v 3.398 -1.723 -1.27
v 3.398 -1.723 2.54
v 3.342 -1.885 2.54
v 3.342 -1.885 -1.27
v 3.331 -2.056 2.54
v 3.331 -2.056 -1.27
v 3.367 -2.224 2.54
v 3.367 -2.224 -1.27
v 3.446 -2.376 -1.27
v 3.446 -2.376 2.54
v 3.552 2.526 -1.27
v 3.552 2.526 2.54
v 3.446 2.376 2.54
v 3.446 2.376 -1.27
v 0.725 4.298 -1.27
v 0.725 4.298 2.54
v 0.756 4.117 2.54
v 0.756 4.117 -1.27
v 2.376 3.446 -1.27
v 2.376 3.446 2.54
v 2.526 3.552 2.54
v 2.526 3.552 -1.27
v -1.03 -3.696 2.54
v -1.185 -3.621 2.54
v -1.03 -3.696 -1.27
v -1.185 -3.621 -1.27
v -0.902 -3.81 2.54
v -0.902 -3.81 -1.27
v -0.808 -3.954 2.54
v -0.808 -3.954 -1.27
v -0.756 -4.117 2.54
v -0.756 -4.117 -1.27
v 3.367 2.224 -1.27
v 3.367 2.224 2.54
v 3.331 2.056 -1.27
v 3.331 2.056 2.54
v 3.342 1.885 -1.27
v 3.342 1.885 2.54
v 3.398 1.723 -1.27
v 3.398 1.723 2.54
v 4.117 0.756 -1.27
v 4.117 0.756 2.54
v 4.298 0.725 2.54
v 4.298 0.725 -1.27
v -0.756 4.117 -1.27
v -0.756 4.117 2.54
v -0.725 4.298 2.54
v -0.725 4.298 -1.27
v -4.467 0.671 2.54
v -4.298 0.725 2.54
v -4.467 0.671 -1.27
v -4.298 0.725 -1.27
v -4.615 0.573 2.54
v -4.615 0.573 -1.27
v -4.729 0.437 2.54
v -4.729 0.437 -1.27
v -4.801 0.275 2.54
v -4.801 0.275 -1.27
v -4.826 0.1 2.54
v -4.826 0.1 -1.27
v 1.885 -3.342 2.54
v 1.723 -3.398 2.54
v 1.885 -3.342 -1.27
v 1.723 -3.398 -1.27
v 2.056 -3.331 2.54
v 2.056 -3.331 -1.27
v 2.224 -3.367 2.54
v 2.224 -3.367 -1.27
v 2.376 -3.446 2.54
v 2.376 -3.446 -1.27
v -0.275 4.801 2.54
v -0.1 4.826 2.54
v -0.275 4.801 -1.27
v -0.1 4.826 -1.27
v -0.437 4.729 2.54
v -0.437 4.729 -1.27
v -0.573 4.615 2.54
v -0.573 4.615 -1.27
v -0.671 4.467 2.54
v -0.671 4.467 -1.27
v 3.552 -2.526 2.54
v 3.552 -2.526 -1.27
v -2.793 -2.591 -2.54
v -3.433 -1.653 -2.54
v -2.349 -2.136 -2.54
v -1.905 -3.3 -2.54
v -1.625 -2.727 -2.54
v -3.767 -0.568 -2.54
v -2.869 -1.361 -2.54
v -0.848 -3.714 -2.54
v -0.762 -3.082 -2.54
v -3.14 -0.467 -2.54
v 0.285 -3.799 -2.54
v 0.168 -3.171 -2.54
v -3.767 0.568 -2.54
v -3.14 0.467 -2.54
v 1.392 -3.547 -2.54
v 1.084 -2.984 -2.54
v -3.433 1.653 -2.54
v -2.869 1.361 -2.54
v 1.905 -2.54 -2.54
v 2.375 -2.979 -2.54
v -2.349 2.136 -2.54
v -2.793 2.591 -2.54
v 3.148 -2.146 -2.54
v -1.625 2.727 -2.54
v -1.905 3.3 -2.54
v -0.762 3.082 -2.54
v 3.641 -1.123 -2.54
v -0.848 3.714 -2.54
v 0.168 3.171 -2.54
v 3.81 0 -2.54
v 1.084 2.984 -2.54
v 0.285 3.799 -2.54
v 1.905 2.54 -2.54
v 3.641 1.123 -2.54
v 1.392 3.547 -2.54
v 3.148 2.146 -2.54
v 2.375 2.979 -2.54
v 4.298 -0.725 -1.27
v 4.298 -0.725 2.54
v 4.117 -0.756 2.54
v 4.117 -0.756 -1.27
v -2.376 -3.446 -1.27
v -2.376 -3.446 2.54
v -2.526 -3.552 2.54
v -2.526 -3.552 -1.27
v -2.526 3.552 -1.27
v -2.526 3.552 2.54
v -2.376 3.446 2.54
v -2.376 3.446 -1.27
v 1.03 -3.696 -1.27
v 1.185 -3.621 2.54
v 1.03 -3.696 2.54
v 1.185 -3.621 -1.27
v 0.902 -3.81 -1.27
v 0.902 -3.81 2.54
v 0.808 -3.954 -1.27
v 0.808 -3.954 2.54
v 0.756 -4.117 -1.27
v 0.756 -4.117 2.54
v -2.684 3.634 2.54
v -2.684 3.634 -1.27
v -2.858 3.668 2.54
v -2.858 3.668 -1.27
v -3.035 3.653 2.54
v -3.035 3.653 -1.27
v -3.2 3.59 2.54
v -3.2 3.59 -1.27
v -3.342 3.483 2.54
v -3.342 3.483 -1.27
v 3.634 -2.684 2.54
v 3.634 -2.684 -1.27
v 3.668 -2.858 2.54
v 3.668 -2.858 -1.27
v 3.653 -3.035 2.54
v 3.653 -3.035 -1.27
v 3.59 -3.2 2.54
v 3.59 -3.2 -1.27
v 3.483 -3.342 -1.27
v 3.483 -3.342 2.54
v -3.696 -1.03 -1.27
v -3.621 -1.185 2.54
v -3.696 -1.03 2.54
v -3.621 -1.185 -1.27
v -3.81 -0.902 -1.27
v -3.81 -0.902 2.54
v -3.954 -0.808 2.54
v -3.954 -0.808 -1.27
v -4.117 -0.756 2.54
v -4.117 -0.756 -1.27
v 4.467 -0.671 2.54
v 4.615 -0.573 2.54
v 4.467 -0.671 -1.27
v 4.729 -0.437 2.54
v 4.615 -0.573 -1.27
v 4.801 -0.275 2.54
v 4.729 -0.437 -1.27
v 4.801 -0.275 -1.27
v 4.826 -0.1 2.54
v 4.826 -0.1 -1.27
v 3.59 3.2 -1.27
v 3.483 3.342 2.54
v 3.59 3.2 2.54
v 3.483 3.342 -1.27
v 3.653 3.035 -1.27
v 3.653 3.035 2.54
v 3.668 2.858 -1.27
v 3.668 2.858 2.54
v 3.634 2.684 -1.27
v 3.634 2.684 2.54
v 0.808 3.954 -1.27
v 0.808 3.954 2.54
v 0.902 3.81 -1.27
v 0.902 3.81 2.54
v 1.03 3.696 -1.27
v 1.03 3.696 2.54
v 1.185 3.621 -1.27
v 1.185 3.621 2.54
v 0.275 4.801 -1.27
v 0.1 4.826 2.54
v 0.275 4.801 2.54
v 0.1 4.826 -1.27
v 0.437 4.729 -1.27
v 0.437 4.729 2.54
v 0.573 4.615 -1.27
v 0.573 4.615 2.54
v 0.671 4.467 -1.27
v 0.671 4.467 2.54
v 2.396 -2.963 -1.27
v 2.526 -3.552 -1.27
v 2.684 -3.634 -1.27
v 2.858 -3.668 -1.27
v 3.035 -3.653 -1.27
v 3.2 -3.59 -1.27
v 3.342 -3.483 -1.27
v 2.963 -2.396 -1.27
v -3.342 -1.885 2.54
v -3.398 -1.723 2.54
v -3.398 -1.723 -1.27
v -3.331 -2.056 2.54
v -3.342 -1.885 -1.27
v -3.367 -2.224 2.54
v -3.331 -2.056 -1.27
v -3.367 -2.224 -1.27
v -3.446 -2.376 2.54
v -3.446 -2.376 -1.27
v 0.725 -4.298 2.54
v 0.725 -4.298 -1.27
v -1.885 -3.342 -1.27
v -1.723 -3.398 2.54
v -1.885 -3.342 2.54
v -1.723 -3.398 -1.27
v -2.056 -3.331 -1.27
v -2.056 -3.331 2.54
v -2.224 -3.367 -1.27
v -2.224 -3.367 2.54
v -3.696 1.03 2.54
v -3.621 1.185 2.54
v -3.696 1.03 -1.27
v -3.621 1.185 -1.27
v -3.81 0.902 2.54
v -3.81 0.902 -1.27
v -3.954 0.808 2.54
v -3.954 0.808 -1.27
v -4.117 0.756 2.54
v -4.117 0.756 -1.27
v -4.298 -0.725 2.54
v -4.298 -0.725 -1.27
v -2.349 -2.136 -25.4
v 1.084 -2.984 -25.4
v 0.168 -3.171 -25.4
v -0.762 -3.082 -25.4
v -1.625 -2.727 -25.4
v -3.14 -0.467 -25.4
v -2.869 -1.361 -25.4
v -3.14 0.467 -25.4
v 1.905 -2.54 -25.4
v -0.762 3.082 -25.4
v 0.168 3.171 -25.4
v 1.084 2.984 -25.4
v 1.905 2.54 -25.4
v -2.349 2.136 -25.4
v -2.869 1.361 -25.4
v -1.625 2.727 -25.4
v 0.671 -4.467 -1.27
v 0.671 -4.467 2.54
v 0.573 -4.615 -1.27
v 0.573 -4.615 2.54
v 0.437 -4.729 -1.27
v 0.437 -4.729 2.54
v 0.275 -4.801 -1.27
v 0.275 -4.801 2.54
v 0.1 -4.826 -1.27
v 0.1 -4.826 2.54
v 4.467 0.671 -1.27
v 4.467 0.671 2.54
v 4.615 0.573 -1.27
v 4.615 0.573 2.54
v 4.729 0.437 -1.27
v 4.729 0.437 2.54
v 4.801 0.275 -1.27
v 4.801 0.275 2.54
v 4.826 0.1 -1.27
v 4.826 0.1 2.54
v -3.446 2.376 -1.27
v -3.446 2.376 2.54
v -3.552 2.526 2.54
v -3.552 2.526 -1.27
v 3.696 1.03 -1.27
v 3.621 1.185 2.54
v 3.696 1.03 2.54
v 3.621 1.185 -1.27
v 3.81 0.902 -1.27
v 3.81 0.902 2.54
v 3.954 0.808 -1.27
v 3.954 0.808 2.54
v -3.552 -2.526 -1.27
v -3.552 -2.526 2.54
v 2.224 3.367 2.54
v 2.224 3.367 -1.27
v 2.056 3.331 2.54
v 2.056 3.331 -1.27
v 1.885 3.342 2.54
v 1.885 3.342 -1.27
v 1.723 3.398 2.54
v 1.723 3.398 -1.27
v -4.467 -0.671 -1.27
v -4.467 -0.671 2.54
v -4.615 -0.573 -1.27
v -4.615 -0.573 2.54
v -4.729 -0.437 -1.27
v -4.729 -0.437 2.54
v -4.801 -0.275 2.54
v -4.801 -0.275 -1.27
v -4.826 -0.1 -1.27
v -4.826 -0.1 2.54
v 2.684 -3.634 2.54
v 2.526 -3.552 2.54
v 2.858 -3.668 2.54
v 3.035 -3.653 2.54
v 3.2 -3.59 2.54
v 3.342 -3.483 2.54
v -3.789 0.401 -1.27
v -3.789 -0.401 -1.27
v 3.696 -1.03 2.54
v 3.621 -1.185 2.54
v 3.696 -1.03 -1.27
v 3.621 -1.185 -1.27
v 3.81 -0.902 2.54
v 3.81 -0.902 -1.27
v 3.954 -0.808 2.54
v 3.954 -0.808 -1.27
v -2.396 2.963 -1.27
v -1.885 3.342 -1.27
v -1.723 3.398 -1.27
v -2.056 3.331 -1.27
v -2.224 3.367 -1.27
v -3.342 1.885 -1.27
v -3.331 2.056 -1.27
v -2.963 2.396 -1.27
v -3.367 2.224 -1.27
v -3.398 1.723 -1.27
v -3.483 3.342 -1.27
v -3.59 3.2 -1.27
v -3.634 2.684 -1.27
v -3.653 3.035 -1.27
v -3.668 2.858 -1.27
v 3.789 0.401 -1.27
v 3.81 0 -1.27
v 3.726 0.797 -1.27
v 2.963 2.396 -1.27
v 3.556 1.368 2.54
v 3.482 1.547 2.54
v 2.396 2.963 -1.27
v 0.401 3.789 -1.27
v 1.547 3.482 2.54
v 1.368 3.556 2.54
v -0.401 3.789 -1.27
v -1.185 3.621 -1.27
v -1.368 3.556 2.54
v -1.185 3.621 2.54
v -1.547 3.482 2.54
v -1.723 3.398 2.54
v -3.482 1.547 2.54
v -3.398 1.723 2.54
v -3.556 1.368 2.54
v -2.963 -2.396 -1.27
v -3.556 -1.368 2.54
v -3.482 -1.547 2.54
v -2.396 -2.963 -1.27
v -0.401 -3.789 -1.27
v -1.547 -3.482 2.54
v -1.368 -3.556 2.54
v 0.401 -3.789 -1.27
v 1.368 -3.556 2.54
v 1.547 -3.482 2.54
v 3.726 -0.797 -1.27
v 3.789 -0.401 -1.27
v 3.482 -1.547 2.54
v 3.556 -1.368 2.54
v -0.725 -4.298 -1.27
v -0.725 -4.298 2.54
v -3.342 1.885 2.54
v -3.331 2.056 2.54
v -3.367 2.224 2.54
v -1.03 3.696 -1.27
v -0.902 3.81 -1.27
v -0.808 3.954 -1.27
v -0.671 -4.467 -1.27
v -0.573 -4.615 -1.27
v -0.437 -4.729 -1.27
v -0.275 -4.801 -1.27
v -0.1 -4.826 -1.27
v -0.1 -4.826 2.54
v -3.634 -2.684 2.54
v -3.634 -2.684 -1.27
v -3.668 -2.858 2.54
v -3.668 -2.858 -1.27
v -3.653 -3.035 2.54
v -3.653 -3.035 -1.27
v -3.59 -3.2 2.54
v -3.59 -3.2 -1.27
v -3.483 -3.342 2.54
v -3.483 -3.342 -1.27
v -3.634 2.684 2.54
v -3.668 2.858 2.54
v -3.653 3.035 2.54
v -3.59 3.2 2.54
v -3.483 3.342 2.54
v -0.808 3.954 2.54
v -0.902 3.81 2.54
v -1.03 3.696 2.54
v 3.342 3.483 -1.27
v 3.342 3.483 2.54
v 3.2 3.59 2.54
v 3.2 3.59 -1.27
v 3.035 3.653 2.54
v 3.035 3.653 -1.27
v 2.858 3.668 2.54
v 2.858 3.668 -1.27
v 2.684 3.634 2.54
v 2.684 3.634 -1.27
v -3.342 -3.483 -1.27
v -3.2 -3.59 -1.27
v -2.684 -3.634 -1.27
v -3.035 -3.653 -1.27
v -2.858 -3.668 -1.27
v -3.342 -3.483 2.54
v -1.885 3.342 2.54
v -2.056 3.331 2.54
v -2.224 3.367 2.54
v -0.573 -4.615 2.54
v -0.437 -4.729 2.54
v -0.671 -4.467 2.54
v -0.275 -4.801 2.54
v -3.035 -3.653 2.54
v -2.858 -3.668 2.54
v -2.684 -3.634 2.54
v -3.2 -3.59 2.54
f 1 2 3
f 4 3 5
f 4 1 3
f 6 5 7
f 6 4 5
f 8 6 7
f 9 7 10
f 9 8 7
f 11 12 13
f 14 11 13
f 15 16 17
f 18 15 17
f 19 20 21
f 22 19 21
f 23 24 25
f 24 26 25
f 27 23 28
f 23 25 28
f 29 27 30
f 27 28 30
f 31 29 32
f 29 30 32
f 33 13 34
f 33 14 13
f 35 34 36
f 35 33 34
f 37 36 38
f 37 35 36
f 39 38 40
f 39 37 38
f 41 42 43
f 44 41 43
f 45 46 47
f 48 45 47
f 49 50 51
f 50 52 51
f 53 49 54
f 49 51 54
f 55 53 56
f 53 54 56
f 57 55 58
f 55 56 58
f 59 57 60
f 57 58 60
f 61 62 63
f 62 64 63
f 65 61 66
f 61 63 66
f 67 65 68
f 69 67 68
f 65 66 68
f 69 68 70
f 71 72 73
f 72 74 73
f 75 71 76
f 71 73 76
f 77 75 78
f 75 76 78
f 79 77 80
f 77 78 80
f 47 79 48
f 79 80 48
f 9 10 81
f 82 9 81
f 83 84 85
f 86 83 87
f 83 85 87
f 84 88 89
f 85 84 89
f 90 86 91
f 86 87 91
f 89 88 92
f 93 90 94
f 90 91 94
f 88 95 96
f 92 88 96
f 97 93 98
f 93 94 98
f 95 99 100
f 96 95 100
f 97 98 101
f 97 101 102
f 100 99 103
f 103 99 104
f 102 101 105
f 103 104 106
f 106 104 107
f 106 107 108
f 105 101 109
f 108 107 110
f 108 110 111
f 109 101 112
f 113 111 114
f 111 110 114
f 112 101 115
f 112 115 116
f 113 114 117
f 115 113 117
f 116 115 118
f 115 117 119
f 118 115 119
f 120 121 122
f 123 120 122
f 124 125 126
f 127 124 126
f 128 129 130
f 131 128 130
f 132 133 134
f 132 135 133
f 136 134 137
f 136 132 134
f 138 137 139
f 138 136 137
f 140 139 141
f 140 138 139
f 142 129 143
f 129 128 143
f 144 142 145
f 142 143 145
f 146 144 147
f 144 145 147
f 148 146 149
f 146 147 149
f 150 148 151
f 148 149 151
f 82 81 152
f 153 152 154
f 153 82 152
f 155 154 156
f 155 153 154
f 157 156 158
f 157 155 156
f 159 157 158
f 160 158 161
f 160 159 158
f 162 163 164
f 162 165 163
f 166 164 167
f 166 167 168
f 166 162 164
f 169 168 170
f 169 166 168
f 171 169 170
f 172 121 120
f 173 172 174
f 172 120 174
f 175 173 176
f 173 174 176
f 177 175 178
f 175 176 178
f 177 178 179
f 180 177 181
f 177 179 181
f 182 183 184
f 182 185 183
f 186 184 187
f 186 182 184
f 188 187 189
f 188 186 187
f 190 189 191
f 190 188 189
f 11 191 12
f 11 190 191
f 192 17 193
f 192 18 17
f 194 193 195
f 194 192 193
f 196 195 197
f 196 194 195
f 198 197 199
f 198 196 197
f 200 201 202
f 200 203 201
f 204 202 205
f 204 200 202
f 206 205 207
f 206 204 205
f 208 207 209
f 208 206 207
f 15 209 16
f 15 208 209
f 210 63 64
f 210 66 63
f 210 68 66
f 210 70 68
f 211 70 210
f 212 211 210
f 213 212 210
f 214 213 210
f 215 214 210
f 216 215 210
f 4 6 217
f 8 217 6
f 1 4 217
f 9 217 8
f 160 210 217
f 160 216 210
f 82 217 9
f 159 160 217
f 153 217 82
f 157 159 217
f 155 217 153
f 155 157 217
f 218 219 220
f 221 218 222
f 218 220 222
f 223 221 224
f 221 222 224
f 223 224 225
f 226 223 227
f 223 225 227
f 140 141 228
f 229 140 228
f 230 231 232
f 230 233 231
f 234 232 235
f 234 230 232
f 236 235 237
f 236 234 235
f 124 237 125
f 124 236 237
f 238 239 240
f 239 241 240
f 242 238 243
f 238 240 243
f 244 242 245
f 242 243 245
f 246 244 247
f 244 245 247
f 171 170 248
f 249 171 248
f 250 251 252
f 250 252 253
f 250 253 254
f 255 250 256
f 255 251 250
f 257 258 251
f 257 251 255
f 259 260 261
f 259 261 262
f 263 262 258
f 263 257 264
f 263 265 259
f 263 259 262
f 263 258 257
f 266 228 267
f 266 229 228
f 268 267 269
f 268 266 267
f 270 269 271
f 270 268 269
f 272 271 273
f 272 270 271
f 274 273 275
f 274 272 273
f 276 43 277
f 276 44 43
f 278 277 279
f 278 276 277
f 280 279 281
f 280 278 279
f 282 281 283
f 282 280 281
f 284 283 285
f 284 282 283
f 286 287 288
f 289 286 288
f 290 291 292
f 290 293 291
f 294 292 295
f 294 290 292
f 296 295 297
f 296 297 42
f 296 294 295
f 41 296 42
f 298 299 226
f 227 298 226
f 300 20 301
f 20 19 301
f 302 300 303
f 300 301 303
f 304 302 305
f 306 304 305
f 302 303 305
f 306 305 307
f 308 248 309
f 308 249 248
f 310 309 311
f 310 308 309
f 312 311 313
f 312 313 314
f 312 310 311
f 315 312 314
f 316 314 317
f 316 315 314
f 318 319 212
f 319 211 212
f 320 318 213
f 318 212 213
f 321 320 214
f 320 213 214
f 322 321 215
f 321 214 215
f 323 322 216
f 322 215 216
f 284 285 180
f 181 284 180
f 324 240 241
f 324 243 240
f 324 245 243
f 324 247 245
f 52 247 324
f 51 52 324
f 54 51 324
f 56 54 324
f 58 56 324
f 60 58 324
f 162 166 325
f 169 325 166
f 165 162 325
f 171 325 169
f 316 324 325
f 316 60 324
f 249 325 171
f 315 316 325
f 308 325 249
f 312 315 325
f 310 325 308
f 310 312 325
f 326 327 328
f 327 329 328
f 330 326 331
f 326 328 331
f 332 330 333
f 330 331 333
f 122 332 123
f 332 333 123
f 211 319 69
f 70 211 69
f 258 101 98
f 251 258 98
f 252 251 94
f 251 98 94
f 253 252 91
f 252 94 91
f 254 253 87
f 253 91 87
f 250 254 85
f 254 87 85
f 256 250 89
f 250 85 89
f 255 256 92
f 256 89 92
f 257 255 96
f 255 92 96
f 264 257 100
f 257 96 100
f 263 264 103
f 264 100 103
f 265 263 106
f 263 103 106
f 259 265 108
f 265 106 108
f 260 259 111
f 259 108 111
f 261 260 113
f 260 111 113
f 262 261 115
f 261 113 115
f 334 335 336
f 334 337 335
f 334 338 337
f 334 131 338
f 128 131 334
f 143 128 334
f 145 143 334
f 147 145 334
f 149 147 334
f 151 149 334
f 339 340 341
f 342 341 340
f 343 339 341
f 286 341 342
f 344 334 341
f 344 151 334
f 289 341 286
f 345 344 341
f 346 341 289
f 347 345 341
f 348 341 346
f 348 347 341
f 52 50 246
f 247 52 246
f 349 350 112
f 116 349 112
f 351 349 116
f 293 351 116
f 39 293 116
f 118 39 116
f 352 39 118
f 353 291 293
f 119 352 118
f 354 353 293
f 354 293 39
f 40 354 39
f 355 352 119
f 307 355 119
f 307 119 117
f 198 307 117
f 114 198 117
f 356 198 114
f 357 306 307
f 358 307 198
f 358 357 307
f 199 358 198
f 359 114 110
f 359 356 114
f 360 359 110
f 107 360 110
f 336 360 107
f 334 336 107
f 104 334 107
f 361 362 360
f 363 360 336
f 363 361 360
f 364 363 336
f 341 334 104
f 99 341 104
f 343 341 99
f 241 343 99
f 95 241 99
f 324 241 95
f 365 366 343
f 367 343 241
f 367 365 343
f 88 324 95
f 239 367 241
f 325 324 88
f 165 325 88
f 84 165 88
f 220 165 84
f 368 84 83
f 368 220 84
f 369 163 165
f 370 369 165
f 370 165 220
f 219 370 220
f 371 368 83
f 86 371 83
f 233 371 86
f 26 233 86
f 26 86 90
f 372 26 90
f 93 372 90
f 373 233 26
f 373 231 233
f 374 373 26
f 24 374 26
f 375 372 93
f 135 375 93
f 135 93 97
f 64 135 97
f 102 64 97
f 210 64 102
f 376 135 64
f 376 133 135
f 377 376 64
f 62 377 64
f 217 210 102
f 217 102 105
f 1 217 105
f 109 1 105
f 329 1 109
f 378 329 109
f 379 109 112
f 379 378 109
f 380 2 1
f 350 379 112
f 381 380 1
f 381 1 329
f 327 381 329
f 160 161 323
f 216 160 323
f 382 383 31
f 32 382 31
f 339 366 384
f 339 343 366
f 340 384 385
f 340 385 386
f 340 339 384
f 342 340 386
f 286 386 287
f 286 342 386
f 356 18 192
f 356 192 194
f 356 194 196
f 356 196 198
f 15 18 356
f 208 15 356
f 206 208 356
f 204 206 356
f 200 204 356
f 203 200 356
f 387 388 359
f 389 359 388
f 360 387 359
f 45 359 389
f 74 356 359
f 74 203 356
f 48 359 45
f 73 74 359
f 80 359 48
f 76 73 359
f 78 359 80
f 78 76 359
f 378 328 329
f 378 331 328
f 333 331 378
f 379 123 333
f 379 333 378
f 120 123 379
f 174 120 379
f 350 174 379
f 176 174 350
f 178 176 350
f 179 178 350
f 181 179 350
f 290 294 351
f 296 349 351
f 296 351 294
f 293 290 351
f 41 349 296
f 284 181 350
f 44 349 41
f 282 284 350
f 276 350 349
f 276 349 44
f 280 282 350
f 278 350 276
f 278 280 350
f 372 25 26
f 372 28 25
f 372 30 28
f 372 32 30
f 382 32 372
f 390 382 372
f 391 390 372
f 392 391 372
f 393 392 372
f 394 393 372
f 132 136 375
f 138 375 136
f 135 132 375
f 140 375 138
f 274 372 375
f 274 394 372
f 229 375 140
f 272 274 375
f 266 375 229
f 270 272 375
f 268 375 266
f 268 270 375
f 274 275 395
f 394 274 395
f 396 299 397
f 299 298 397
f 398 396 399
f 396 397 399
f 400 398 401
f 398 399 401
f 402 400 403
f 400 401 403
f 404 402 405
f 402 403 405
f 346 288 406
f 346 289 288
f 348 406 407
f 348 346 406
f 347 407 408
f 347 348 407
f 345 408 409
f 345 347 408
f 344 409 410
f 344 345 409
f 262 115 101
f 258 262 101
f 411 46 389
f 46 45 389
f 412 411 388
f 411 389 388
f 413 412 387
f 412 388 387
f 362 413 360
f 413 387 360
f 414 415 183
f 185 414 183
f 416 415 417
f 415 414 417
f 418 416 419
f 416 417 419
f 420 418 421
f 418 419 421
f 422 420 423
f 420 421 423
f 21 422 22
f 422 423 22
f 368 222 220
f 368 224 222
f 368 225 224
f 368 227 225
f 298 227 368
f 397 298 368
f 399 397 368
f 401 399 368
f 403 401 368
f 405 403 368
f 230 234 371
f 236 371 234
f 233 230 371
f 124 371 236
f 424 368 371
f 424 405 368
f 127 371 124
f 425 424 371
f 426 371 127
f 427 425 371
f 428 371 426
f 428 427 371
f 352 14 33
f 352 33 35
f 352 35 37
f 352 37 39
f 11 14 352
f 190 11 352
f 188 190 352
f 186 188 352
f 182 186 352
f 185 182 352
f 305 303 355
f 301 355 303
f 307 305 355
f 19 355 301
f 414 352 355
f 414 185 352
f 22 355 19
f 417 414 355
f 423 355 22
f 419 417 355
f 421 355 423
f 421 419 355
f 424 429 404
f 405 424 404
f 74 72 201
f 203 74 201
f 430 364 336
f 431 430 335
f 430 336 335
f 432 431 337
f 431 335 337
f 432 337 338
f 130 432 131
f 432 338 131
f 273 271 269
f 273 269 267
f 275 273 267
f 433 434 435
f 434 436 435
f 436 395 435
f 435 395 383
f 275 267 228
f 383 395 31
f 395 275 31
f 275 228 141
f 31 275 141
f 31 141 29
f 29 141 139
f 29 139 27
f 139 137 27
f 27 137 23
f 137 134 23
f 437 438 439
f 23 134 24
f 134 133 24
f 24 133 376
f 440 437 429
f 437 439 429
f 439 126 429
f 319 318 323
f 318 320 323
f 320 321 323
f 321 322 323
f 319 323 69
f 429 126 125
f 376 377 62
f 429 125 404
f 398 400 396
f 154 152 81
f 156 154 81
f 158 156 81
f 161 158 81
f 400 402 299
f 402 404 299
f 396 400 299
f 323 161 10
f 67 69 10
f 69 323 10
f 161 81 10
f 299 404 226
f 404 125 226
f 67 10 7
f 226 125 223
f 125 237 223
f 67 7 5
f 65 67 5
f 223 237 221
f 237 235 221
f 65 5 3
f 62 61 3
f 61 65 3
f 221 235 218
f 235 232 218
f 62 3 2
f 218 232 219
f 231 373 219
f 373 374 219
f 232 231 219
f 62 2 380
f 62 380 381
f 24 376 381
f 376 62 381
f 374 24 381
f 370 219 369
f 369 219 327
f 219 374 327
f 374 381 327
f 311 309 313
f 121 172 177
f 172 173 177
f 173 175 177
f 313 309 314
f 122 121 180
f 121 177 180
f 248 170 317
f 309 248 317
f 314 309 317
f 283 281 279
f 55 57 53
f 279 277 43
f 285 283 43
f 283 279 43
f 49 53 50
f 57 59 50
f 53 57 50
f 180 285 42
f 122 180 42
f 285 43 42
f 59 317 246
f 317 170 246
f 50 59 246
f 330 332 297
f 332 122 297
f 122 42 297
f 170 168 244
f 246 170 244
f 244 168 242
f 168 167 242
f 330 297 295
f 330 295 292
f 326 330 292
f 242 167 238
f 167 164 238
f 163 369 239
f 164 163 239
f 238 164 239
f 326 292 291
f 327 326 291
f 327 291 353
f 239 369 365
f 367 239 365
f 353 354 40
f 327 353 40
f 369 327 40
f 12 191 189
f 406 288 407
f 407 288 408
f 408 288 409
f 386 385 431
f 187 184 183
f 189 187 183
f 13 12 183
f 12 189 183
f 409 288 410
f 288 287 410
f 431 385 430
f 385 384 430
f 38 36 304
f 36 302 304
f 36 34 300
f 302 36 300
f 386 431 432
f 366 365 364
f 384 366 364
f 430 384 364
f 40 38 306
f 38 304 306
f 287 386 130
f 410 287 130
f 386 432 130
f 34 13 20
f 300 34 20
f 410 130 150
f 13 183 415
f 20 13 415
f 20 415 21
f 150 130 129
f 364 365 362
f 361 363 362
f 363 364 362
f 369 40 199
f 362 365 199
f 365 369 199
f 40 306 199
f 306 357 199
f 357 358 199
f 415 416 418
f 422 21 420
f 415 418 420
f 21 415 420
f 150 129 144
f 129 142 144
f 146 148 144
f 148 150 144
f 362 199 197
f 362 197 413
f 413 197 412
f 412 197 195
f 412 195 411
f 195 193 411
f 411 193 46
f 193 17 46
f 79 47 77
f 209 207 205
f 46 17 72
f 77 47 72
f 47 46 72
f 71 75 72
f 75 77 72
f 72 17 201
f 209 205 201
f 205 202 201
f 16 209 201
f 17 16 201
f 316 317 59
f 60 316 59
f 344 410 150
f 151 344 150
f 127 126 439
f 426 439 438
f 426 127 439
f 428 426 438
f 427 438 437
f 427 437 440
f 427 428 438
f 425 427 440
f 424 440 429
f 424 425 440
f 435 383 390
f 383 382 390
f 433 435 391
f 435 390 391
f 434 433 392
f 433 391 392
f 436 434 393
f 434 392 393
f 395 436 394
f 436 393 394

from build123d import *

# Parameters (mm, degrees)
BOSS_EXTRUDE1_DEPTH      = 25.4
SKETCH2_R                = 3.81
BOSS_EXTRUDE2_DEPTH      = 2.54
BOSS_EXTRUDE3_DEPTH      = 3.81
FILLET1_R                = 0.635
CIRPATTERN1_COUNT        = 8
FILLET1_OF_CIRPATTERN1_R = 0.635


with BuildPart() as part:
    # Sketch1 → Boss-Extrude1 (new body)
    with BuildSketch(Plane.XY):
        with BuildLine():
            Line((1.905, 2.54), (1.905, -2.54))
            ThreePointArc((1.905, -2.54), (-3.175, 0), (1.905, 2.54))
        make_face()
    extrude(amount=-BOSS_EXTRUDE1_DEPTH)

    # Sketch2 → Boss-Extrude2 (add, symmetric)
    with BuildSketch(Plane.XY):
        Circle(SKETCH2_R)
    extrude(amount=BOSS_EXTRUDE2_DEPTH, both=True)

    # Sketch4 → Boss-Extrude3 (add)
    with BuildSketch(Plane.XY.offset(2.54)):
        Polygon((-0.635, 4.826), (0.635, 4.826), (0.824634929, 3.719687787), (-0.824634929, 3.719687787), align=None)
    boss_extrude3 = extrude(amount=-BOSS_EXTRUDE3_DEPTH)

    # Fillet1
    fillet1_edges = [part.edges().sort_by_distance(p)[0] for p in [
        (0.635, 4.826, 0.635),
        (0.824634929, 3.719687787, 0.635),
        (-0.824634929, 3.719687787, 0.635),
        (-0.635, 4.826, 0.635),
    ]]
    fillet(fillet1_edges, radius=FILLET1_R)

    # CirPattern1: Boss-Extrude3 ×8 about axis
    cirpattern1_axis = Axis((0, 0, 0), (0, 0, 1))
    for i in range(1, CIRPATTERN1_COUNT):
        add(boss_extrude3.rotate(cirpattern1_axis, i * 360 / CIRPATTERN1_COUNT))

    # Fillet1 of CirPattern1
    fillet1_of_cirpattern1_edges = [part.edges().sort_by_distance(p)[0] for p in [
        (-2.96348452, 3.861510132, 0.635),
        (-2.047111508, 3.213321409, 0.635),
        (-3.213321409, 2.047111508, 0.635),
        (-3.861510132, 2.96348452, 0.635),
        (-4.826, 0.635, 0.635),
        (-3.719687787, 0.824634929, 0.635),
        (-3.719687787, -0.824634929, 0.635),
        (-4.826, -0.635, 0.635),
        (-3.861510132, -2.96348452, 0.635),
        (-3.213321409, -2.047111508, 0.635),
        (-2.047111508, -3.213321409, 0.635),
        (-2.96348452, -3.861510132, 0.635),
        (-0.635, -4.826, 0.635),
        (-0.824634929, -3.719687787, 0.635),
        (0.824634929, -3.719687787, 0.635),
        (0.635, -4.826, 0.635),
        (2.96348452, -3.861510132, 0.635),
        (2.047111508, -3.213321409, 0.635),
        (3.213321409, -2.047111508, 0.635),
        (3.861510132, -2.96348452, 0.635),
        (4.826, -0.635, 0.635),
        (3.719687787, -0.824634929, 0.635),
        (3.719687787, 0.824634929, 0.635),
        (4.826, 0.635, 0.635),
        (3.861510132, 2.96348452, 0.635),
        (3.213321409, 2.047111508, 0.635),
        (2.047111508, 3.213321409, 0.635),
        (2.96348452, 3.861510132, 0.635),
    ]]
    fillet(fillet1_of_cirpattern1_edges, radius=FILLET1_OF_CIRPATTERN1_R)


solid = part.part
